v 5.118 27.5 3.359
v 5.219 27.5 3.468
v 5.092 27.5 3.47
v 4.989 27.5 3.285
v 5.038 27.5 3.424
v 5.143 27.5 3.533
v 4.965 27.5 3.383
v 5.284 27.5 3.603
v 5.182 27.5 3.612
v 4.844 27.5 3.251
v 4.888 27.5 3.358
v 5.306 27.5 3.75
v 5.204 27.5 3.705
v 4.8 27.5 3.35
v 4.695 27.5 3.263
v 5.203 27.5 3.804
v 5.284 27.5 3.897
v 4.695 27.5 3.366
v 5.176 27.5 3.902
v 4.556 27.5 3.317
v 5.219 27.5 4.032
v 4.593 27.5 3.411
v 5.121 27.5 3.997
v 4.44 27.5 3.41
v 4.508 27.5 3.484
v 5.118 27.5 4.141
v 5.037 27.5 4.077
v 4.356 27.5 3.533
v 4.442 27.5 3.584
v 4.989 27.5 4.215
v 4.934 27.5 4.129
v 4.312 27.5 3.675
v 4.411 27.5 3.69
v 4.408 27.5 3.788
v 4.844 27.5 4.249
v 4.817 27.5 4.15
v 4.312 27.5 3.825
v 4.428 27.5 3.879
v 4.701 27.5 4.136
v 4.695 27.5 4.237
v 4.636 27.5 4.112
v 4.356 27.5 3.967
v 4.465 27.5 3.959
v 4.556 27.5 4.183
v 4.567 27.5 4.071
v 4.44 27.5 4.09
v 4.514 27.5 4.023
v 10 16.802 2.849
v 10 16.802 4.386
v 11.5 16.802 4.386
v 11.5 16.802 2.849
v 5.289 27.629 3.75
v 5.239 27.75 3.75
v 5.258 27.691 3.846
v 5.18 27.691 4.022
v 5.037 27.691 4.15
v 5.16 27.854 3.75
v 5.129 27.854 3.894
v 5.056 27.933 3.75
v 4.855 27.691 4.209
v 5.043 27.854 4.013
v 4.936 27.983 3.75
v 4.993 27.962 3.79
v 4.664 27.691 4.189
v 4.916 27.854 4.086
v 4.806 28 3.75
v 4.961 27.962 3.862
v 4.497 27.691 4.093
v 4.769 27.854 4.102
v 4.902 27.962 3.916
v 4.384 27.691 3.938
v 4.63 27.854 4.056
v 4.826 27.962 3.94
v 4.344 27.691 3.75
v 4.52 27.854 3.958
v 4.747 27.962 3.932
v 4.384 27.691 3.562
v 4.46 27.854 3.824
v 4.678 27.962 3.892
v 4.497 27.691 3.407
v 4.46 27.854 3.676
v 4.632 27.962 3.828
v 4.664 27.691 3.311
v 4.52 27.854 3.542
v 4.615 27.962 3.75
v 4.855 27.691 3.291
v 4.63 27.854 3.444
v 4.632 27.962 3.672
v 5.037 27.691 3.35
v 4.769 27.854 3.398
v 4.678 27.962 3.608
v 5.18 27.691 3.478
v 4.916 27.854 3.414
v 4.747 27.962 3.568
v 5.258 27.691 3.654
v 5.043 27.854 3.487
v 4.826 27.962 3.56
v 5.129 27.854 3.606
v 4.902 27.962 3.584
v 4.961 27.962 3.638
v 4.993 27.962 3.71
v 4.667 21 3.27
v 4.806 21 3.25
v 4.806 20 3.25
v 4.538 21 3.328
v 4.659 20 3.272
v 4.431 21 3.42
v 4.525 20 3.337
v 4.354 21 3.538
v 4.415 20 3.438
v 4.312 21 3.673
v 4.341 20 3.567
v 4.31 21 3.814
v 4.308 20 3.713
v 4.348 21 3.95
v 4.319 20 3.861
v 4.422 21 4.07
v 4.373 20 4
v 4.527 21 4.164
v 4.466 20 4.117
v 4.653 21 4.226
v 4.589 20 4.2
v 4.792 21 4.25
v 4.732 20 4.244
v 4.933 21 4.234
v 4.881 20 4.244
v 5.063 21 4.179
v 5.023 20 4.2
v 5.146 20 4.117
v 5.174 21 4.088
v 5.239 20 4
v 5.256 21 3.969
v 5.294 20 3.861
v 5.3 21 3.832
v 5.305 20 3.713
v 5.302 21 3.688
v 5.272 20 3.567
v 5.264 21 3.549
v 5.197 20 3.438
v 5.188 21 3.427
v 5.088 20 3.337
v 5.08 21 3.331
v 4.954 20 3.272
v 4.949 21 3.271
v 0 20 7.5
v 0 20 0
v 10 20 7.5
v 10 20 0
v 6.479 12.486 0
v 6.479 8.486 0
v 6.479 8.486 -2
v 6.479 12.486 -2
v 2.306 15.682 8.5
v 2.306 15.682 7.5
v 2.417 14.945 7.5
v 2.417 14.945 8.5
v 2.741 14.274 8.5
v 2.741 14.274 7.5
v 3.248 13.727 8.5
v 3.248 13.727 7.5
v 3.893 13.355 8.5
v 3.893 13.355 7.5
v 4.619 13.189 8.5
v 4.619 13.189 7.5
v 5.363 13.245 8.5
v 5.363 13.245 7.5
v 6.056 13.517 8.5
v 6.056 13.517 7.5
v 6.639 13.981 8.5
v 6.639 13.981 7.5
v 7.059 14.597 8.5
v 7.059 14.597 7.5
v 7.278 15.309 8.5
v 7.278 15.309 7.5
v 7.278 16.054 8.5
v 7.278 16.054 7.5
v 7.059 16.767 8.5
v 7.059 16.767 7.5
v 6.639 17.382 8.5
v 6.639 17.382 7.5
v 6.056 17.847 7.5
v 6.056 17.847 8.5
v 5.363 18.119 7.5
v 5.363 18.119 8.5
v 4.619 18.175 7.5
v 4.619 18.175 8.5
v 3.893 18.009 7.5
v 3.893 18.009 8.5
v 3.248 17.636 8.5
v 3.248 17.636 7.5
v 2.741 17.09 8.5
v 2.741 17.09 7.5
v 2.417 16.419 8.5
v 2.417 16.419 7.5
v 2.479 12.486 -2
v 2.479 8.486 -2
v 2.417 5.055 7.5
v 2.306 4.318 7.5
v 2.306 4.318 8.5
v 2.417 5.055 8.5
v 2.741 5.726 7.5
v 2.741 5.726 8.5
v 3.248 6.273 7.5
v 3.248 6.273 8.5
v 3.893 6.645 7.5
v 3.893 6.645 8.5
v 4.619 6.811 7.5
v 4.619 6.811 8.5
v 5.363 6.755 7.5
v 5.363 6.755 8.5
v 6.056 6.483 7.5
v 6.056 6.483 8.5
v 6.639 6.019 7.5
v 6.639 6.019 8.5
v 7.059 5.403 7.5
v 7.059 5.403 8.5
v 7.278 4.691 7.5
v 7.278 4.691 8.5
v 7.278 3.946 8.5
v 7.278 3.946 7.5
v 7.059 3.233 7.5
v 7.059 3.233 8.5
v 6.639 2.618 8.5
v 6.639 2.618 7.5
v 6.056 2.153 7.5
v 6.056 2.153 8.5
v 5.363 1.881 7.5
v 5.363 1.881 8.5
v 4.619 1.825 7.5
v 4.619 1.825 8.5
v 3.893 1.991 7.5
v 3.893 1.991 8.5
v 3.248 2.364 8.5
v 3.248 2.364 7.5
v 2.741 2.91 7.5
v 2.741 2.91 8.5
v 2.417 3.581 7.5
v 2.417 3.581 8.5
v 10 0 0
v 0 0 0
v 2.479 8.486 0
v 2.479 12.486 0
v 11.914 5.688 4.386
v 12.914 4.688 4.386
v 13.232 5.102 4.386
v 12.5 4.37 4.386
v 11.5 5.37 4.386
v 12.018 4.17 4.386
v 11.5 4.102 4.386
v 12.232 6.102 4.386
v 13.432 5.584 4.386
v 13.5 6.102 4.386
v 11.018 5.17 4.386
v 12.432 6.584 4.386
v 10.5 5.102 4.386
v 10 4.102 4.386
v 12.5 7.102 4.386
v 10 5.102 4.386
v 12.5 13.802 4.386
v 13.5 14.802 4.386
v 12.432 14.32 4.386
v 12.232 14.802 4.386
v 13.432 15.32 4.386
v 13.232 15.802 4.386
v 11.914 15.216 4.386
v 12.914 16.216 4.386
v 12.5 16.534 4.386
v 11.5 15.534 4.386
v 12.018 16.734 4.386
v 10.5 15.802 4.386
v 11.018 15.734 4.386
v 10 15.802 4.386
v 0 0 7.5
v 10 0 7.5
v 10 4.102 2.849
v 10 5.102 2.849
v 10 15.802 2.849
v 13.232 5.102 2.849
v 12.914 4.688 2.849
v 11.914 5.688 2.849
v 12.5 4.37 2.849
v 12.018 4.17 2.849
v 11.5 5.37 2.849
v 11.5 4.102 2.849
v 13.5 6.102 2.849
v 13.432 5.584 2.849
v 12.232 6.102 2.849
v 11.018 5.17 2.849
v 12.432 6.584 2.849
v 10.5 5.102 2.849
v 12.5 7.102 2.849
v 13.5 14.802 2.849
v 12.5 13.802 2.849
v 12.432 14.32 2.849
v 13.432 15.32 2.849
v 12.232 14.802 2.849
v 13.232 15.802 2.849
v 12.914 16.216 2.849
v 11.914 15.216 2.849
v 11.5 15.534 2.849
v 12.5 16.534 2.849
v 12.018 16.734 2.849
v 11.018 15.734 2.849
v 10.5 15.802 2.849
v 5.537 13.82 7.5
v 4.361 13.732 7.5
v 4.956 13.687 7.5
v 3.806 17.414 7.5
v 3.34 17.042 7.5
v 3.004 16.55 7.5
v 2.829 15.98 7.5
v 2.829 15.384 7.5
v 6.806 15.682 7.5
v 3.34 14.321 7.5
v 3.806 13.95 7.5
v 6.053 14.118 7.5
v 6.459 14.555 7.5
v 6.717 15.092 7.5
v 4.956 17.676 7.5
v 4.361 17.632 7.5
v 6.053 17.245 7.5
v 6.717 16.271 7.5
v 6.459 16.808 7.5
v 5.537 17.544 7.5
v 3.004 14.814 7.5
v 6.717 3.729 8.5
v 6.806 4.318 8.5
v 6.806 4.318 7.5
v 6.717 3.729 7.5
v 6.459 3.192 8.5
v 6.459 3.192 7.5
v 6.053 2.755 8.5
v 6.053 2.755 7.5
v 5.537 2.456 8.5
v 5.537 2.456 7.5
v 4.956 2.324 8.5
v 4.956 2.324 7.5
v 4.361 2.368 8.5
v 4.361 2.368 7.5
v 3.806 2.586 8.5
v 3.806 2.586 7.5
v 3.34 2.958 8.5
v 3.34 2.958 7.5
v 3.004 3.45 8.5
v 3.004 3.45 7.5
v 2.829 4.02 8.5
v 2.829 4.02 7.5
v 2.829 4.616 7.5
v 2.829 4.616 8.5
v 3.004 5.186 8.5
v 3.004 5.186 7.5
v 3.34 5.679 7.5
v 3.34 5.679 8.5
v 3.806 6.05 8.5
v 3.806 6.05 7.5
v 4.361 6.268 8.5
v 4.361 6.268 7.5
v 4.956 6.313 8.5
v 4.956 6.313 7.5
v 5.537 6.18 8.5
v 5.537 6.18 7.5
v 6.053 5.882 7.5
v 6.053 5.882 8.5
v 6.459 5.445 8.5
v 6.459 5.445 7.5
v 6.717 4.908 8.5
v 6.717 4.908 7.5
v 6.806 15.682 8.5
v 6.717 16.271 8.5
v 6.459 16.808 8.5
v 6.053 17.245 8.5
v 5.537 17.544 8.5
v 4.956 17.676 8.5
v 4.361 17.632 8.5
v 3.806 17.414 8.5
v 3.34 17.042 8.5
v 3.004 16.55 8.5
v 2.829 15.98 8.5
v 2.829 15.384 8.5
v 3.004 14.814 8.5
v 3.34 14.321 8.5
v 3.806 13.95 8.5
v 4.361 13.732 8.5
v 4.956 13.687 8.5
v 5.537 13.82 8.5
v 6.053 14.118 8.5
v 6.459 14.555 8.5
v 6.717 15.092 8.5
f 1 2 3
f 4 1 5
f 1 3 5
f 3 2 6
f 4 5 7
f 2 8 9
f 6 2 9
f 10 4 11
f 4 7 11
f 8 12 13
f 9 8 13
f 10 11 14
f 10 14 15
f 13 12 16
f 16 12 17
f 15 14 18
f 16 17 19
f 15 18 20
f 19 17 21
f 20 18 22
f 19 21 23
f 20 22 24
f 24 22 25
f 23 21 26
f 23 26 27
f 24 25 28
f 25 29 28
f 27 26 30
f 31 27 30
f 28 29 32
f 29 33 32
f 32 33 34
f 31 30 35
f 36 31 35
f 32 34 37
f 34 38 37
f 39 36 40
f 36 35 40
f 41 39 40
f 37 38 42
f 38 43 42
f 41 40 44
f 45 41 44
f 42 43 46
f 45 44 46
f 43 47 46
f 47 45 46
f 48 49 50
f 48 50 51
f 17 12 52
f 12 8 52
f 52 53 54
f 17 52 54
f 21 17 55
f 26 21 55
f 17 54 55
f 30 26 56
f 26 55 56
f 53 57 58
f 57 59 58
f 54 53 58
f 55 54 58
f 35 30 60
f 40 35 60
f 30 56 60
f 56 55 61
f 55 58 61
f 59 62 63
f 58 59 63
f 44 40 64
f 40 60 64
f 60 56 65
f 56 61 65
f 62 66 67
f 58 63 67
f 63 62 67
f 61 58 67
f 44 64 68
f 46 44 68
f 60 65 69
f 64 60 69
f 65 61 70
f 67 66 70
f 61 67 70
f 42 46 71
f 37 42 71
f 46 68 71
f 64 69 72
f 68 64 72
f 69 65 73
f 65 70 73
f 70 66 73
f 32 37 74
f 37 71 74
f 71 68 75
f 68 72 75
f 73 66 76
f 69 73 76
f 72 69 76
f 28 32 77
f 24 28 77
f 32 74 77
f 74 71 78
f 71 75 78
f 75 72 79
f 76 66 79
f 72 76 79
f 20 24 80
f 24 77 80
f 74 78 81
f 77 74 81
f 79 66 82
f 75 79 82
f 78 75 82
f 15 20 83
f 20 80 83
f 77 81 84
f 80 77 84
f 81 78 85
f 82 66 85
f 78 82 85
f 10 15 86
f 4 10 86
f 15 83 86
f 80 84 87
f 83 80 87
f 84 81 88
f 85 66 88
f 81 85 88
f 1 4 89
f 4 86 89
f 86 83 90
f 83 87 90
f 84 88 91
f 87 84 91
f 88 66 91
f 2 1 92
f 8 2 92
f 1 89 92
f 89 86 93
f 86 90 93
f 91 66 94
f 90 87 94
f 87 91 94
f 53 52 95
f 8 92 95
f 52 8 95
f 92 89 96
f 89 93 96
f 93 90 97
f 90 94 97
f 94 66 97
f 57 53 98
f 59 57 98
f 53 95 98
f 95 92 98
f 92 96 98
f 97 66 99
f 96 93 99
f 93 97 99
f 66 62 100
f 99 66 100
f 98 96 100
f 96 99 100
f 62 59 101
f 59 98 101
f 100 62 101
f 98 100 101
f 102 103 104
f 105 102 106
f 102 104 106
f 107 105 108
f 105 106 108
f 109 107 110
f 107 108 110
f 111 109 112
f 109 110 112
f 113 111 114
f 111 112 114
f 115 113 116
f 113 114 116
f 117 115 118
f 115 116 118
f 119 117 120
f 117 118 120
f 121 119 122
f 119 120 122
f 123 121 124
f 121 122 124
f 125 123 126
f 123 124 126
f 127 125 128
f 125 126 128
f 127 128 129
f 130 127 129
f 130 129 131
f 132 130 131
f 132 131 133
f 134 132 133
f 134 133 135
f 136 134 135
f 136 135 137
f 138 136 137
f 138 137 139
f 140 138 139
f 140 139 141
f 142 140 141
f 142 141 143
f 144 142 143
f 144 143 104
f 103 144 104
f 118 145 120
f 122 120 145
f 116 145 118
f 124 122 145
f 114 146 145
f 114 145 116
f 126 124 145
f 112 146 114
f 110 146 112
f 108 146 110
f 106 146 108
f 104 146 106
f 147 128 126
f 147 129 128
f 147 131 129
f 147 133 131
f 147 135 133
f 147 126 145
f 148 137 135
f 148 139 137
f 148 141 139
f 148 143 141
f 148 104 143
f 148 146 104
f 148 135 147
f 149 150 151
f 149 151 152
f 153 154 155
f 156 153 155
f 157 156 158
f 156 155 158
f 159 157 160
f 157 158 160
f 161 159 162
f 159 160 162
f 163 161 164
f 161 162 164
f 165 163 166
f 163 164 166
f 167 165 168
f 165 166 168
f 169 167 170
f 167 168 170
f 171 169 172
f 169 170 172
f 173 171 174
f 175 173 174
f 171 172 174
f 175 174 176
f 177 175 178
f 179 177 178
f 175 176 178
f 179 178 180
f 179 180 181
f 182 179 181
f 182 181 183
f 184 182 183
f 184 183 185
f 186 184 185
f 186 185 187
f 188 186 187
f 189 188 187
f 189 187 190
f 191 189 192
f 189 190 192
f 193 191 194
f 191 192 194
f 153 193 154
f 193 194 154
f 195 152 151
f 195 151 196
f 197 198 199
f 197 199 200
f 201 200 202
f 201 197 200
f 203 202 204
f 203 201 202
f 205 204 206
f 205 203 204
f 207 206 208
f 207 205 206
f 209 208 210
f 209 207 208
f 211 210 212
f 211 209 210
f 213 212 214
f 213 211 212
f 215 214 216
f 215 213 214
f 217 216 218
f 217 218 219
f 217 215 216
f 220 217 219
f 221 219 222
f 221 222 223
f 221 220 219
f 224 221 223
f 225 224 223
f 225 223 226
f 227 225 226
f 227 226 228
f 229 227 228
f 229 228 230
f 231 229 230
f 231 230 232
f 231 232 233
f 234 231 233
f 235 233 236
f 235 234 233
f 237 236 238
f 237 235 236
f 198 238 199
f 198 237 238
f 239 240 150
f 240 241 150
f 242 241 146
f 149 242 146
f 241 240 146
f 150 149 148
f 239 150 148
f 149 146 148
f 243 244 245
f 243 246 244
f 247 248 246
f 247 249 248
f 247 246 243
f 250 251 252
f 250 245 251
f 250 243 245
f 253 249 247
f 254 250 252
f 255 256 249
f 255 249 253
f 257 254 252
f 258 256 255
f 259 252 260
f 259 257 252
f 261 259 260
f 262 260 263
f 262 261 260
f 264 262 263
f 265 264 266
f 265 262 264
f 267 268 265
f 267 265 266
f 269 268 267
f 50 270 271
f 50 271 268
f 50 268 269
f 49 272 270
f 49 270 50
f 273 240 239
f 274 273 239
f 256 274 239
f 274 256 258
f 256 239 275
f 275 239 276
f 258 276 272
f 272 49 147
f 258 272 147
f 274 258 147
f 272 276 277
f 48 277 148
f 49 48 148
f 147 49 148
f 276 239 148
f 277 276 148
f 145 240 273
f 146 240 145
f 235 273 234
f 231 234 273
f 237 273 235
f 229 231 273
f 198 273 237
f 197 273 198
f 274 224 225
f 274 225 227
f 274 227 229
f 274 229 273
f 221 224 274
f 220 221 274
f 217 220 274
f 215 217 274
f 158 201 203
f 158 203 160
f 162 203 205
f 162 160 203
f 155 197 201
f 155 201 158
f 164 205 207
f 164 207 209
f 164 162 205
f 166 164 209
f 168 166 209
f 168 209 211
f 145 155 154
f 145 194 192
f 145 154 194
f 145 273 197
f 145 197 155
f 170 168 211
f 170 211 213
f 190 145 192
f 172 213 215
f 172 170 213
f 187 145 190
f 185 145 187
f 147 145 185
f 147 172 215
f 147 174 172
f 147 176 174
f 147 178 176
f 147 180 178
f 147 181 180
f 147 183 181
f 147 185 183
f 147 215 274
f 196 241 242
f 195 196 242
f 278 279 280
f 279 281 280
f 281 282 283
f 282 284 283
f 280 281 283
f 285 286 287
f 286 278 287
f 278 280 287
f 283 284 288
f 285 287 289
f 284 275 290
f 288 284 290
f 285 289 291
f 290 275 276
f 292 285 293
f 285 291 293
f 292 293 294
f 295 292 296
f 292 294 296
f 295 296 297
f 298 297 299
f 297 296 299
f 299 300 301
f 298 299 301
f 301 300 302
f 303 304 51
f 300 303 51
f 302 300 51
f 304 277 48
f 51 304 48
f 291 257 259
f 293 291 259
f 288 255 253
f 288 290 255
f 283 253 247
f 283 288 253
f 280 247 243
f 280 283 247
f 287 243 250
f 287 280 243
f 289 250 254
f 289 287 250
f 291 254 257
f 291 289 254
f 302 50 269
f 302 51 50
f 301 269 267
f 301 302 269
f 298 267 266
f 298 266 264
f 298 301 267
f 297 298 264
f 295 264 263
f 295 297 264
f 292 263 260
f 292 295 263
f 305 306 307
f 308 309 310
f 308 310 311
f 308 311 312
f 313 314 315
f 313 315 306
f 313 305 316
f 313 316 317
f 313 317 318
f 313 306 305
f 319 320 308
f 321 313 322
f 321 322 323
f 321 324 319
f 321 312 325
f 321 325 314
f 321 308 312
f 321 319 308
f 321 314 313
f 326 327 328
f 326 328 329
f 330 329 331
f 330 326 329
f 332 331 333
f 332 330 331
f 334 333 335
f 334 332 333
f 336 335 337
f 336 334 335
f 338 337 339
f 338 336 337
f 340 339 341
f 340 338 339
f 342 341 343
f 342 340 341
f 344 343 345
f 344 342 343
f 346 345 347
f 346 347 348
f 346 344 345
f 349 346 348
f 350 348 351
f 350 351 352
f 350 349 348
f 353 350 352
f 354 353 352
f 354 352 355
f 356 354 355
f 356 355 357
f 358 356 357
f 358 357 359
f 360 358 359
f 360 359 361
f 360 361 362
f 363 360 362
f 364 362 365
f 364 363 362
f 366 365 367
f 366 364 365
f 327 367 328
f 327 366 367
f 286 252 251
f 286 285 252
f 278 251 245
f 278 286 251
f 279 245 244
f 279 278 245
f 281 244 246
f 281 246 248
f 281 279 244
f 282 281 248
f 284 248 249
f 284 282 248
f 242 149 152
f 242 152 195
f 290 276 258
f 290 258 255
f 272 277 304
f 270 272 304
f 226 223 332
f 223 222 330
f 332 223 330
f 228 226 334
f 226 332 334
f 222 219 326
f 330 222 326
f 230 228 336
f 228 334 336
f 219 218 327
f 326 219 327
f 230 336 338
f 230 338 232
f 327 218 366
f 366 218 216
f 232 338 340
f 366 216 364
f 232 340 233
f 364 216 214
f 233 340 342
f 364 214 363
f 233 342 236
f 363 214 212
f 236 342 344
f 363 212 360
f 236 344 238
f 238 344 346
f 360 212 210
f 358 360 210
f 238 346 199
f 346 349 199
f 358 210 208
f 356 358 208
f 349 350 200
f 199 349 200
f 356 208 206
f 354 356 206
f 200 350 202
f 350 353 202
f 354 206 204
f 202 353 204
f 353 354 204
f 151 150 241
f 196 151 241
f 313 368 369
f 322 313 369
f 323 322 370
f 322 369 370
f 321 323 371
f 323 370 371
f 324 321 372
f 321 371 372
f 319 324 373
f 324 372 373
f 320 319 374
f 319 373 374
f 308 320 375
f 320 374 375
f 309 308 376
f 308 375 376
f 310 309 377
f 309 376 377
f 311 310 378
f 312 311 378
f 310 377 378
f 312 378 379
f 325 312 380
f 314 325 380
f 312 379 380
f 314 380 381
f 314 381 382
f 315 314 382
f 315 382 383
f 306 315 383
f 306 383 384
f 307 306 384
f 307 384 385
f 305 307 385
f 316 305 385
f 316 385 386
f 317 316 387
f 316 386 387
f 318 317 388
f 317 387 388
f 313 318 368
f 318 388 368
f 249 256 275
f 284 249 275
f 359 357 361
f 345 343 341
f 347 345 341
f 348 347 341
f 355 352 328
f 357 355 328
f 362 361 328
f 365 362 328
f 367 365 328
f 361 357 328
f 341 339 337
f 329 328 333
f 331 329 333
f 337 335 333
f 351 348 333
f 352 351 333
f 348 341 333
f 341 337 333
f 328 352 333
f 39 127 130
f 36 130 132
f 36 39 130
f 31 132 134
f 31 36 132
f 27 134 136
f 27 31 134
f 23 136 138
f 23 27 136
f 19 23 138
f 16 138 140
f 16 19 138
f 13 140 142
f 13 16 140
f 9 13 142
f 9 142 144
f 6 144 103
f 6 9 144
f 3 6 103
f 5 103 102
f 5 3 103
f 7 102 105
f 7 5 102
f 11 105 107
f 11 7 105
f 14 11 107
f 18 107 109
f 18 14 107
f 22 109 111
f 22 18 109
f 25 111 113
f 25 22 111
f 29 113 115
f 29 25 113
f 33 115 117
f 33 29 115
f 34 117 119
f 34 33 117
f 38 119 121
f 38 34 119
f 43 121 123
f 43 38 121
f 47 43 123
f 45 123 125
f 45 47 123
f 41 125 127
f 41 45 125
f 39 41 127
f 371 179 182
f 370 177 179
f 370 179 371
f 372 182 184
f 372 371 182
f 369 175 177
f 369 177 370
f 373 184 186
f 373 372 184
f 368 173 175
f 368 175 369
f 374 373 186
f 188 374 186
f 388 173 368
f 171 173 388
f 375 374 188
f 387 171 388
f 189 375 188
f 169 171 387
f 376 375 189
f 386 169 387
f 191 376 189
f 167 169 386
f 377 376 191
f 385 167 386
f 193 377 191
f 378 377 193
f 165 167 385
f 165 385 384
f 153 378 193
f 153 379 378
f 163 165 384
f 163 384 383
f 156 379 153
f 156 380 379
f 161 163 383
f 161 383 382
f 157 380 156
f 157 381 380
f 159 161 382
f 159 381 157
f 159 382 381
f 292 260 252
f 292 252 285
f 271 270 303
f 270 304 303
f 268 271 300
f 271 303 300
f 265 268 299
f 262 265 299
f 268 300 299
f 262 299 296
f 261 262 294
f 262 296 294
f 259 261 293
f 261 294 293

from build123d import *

# Parameters (mm, degrees)
SKETCH1_W           = 10
SKETCH1_H           = 20
BOSS_EXTRUDE1_DEPTH = 7.5
SKETCH2_R           = 2.5
BOSS_EXTRUDE2_DEPTH = 1
SKETCH3_R           = 2
CUT_EXTRUDE1_DEPTH  = 1
SKETCH4_R           = 0.5
BOSS_EXTRUDE3_DEPTH = 1
SKETCH22_W          = 1.536676655
SKETCH22_H          = 12.700180583
BOSS_EXTRUDE4_DEPTH = 3.5
SKETCH25_W          = 2.5
SKETCH25_H          = 10.700180583
CUT_EXTRUDE4_DEPTH  = 5
FILLET1_R           = 2
FILLET2_R           = 2
FILLET3_R           = 2
FILLET4_R           = 2
SKETCH26_W          = 4
SKETCH26_H          = 4
BOSS_EXTRUDE5_DEPTH = 2


with BuildPart() as part:
    # Sketch1 → Boss-Extrude1 (new body)
    with BuildSketch(Plane.XY):
        with Locations((5, 10)):
            Rectangle(SKETCH1_W, SKETCH1_H)
    extrude(amount=BOSS_EXTRUDE1_DEPTH)

    # Sketch2 → Boss-Extrude2 (add)
    with BuildSketch(Plane.XY.offset(7.5)):
        with Locations(Location((4.806301262, 15.681829646, 0), (0, 0, 180))):
            Circle(SKETCH2_R)
    boss_extrude2 = extrude(amount=BOSS_EXTRUDE2_DEPTH)

    # Sketch3 → Cut-Extrude1 (cut)
    with BuildSketch(Plane.XY.offset(8.5)):
        with Locations((4.806301262, 15.681829646)):
            Circle(SKETCH3_R)
    cut_extrude1 = extrude(amount=-CUT_EXTRUDE1_DEPTH, mode=Mode.SUBTRACT)

    # Mirror1: Boss-Extrude2, Cut-Extrude1 across plane
    add(boss_extrude2.mirror(Plane.ZX.offset(10)))
    add(cut_extrude1.mirror(Plane.ZX.offset(10)), mode=Mode.SUBTRACT)

    # Sketch4 → Boss-Extrude3 (add)
    with BuildSketch(Plane(origin=(0, 20, 0), x_dir=(1, 0, 0), z_dir=(0, 1, 0))):
        with Locations(Location((4.806301262, -3.75, 0), (0, 0, 90))):
            Circle(SKETCH4_R)
    extrude(amount=BOSS_EXTRUDE3_DEPTH)

    # Loft1: read off the stored shape, not the designer's step
    # Loft1: loft between two sections, ruled curve by curve
    loft1_from = [
        Edge.make_bspline([(5.062712373, 21, 4.179247414), (5.921207201, 21, 3.666425193), (5.408384979, 21, 2.807930365), (4.549890151, 21, 3.320752586), (3.691395324, 21, 3.833574807), (4.204217545, 21, 4.692069635), (5.062712373, 21, 4.179247414)], [0, 0, 0, 0, 0.5, 0.5, 0.5, 1, 1, 1, 1], 3, [1, 0.333333333, 0.333333333, 1, 0.333333333, 0.333333333, 1]),
    ]
    loft1_to = [
        Edge.make_bspline([(4.701236965, 27.5, 4.1359553), (5.473147564, 27.5, 4.346083894), (5.683276159, 27.5, 3.574173295), (4.911365559, 27.5, 3.3640447), (4.13945496, 27.5, 3.153916106), (3.929326365, 27.5, 3.925826705), (4.701236965, 27.5, 4.1359553)], [0, 0, 0, 0, 0.5, 0.5, 0.5, 1, 1, 1, 1], 3, [1, 0.333333333, 0.333333333, 1, 0.333333333, 0.333333333, 1]),
    ]
    loft1 = Solid(Shell([*[Face.make_surface_from_curves(loft1_from[k], loft1_to[k]) for k in range(1)], Face(Wire(loft1_from)), Face(Wire(loft1_to))]))
    add(loft1)

    # Sketch20 → Revolve1 (revolve)
    with BuildSketch(Plane.XY.offset(3.75), mode=Mode.PRIVATE) as revolve1_sk:
        with BuildLine():
            Line((4.806301262, 28), (4.806301262, 27.5))
            Line((4.806301262, 27.5), (4.306301262, 27.5))
            ThreePointArc((4.306301262, 27.5), (4.452747871, 27.853553391), (4.806301262, 28))
        make_face()
    revolve(revolve1_sk.sketch.rotate(Axis((4.806301262, 28, 3.75), (0, -1, 0)), 180), axis=Axis((4.806301262, 28, 3.75), (0, -1, 0)))

    # Sketch22 → Boss-Extrude4 (add)
    with BuildSketch(Plane(origin=(10, 0, 0), x_dir=(0, 0, -1), z_dir=(1, 0, 0))):
        with Locations((-3.61725079, 10.452084784)):
            Rectangle(SKETCH22_W, SKETCH22_H)
    extrude(amount=BOSS_EXTRUDE4_DEPTH)

    # Sketch25 → Cut-Extrude4 (cut)
    with BuildSketch(Plane.XY.offset(4.385589117)):
        with Locations((11.25, 10.452084784)):
            Rectangle(SKETCH25_W, SKETCH25_H)
    extrude(amount=-CUT_EXTRUDE4_DEPTH, mode=Mode.SUBTRACT)

    # Fillet1
    fillet1_edges = [part.edges().sort_by_distance(p)[0] for p in [
        (13.5, 16.802175075, 3.617250789),
    ]]
    fillet(fillet1_edges, radius=FILLET1_R)

    # Fillet2
    fillet2_edges = [part.edges().sort_by_distance(p)[0] for p in [
        (12.5, 15.802175075, 3.617250789),
    ]]
    fillet(fillet2_edges, radius=FILLET2_R)

    # Fillet3
    fillet3_edges = [part.edges().sort_by_distance(p)[0] for p in [
        (13.5, 4.101994492, 3.617250789),
    ]]
    fillet(fillet3_edges, radius=FILLET3_R)

    # Fillet4
    fillet4_edges = [part.edges().sort_by_distance(p)[0] for p in [
        (12.5, 5.101994492, 3.617250789),
    ]]
    fillet(fillet4_edges, radius=FILLET4_R)

    # Sketch26 → Boss-Extrude5 (add)
    with BuildSketch(Plane(origin=(0, 0, 0), x_dir=(-1, 0, 0), z_dir=(0, 0, -1))):
        with Locations((-4.478821767, 10.486042594)):
            Rectangle(SKETCH26_W, SKETCH26_H)
    extrude(amount=BOSS_EXTRUDE5_DEPTH)


solid = part.part
